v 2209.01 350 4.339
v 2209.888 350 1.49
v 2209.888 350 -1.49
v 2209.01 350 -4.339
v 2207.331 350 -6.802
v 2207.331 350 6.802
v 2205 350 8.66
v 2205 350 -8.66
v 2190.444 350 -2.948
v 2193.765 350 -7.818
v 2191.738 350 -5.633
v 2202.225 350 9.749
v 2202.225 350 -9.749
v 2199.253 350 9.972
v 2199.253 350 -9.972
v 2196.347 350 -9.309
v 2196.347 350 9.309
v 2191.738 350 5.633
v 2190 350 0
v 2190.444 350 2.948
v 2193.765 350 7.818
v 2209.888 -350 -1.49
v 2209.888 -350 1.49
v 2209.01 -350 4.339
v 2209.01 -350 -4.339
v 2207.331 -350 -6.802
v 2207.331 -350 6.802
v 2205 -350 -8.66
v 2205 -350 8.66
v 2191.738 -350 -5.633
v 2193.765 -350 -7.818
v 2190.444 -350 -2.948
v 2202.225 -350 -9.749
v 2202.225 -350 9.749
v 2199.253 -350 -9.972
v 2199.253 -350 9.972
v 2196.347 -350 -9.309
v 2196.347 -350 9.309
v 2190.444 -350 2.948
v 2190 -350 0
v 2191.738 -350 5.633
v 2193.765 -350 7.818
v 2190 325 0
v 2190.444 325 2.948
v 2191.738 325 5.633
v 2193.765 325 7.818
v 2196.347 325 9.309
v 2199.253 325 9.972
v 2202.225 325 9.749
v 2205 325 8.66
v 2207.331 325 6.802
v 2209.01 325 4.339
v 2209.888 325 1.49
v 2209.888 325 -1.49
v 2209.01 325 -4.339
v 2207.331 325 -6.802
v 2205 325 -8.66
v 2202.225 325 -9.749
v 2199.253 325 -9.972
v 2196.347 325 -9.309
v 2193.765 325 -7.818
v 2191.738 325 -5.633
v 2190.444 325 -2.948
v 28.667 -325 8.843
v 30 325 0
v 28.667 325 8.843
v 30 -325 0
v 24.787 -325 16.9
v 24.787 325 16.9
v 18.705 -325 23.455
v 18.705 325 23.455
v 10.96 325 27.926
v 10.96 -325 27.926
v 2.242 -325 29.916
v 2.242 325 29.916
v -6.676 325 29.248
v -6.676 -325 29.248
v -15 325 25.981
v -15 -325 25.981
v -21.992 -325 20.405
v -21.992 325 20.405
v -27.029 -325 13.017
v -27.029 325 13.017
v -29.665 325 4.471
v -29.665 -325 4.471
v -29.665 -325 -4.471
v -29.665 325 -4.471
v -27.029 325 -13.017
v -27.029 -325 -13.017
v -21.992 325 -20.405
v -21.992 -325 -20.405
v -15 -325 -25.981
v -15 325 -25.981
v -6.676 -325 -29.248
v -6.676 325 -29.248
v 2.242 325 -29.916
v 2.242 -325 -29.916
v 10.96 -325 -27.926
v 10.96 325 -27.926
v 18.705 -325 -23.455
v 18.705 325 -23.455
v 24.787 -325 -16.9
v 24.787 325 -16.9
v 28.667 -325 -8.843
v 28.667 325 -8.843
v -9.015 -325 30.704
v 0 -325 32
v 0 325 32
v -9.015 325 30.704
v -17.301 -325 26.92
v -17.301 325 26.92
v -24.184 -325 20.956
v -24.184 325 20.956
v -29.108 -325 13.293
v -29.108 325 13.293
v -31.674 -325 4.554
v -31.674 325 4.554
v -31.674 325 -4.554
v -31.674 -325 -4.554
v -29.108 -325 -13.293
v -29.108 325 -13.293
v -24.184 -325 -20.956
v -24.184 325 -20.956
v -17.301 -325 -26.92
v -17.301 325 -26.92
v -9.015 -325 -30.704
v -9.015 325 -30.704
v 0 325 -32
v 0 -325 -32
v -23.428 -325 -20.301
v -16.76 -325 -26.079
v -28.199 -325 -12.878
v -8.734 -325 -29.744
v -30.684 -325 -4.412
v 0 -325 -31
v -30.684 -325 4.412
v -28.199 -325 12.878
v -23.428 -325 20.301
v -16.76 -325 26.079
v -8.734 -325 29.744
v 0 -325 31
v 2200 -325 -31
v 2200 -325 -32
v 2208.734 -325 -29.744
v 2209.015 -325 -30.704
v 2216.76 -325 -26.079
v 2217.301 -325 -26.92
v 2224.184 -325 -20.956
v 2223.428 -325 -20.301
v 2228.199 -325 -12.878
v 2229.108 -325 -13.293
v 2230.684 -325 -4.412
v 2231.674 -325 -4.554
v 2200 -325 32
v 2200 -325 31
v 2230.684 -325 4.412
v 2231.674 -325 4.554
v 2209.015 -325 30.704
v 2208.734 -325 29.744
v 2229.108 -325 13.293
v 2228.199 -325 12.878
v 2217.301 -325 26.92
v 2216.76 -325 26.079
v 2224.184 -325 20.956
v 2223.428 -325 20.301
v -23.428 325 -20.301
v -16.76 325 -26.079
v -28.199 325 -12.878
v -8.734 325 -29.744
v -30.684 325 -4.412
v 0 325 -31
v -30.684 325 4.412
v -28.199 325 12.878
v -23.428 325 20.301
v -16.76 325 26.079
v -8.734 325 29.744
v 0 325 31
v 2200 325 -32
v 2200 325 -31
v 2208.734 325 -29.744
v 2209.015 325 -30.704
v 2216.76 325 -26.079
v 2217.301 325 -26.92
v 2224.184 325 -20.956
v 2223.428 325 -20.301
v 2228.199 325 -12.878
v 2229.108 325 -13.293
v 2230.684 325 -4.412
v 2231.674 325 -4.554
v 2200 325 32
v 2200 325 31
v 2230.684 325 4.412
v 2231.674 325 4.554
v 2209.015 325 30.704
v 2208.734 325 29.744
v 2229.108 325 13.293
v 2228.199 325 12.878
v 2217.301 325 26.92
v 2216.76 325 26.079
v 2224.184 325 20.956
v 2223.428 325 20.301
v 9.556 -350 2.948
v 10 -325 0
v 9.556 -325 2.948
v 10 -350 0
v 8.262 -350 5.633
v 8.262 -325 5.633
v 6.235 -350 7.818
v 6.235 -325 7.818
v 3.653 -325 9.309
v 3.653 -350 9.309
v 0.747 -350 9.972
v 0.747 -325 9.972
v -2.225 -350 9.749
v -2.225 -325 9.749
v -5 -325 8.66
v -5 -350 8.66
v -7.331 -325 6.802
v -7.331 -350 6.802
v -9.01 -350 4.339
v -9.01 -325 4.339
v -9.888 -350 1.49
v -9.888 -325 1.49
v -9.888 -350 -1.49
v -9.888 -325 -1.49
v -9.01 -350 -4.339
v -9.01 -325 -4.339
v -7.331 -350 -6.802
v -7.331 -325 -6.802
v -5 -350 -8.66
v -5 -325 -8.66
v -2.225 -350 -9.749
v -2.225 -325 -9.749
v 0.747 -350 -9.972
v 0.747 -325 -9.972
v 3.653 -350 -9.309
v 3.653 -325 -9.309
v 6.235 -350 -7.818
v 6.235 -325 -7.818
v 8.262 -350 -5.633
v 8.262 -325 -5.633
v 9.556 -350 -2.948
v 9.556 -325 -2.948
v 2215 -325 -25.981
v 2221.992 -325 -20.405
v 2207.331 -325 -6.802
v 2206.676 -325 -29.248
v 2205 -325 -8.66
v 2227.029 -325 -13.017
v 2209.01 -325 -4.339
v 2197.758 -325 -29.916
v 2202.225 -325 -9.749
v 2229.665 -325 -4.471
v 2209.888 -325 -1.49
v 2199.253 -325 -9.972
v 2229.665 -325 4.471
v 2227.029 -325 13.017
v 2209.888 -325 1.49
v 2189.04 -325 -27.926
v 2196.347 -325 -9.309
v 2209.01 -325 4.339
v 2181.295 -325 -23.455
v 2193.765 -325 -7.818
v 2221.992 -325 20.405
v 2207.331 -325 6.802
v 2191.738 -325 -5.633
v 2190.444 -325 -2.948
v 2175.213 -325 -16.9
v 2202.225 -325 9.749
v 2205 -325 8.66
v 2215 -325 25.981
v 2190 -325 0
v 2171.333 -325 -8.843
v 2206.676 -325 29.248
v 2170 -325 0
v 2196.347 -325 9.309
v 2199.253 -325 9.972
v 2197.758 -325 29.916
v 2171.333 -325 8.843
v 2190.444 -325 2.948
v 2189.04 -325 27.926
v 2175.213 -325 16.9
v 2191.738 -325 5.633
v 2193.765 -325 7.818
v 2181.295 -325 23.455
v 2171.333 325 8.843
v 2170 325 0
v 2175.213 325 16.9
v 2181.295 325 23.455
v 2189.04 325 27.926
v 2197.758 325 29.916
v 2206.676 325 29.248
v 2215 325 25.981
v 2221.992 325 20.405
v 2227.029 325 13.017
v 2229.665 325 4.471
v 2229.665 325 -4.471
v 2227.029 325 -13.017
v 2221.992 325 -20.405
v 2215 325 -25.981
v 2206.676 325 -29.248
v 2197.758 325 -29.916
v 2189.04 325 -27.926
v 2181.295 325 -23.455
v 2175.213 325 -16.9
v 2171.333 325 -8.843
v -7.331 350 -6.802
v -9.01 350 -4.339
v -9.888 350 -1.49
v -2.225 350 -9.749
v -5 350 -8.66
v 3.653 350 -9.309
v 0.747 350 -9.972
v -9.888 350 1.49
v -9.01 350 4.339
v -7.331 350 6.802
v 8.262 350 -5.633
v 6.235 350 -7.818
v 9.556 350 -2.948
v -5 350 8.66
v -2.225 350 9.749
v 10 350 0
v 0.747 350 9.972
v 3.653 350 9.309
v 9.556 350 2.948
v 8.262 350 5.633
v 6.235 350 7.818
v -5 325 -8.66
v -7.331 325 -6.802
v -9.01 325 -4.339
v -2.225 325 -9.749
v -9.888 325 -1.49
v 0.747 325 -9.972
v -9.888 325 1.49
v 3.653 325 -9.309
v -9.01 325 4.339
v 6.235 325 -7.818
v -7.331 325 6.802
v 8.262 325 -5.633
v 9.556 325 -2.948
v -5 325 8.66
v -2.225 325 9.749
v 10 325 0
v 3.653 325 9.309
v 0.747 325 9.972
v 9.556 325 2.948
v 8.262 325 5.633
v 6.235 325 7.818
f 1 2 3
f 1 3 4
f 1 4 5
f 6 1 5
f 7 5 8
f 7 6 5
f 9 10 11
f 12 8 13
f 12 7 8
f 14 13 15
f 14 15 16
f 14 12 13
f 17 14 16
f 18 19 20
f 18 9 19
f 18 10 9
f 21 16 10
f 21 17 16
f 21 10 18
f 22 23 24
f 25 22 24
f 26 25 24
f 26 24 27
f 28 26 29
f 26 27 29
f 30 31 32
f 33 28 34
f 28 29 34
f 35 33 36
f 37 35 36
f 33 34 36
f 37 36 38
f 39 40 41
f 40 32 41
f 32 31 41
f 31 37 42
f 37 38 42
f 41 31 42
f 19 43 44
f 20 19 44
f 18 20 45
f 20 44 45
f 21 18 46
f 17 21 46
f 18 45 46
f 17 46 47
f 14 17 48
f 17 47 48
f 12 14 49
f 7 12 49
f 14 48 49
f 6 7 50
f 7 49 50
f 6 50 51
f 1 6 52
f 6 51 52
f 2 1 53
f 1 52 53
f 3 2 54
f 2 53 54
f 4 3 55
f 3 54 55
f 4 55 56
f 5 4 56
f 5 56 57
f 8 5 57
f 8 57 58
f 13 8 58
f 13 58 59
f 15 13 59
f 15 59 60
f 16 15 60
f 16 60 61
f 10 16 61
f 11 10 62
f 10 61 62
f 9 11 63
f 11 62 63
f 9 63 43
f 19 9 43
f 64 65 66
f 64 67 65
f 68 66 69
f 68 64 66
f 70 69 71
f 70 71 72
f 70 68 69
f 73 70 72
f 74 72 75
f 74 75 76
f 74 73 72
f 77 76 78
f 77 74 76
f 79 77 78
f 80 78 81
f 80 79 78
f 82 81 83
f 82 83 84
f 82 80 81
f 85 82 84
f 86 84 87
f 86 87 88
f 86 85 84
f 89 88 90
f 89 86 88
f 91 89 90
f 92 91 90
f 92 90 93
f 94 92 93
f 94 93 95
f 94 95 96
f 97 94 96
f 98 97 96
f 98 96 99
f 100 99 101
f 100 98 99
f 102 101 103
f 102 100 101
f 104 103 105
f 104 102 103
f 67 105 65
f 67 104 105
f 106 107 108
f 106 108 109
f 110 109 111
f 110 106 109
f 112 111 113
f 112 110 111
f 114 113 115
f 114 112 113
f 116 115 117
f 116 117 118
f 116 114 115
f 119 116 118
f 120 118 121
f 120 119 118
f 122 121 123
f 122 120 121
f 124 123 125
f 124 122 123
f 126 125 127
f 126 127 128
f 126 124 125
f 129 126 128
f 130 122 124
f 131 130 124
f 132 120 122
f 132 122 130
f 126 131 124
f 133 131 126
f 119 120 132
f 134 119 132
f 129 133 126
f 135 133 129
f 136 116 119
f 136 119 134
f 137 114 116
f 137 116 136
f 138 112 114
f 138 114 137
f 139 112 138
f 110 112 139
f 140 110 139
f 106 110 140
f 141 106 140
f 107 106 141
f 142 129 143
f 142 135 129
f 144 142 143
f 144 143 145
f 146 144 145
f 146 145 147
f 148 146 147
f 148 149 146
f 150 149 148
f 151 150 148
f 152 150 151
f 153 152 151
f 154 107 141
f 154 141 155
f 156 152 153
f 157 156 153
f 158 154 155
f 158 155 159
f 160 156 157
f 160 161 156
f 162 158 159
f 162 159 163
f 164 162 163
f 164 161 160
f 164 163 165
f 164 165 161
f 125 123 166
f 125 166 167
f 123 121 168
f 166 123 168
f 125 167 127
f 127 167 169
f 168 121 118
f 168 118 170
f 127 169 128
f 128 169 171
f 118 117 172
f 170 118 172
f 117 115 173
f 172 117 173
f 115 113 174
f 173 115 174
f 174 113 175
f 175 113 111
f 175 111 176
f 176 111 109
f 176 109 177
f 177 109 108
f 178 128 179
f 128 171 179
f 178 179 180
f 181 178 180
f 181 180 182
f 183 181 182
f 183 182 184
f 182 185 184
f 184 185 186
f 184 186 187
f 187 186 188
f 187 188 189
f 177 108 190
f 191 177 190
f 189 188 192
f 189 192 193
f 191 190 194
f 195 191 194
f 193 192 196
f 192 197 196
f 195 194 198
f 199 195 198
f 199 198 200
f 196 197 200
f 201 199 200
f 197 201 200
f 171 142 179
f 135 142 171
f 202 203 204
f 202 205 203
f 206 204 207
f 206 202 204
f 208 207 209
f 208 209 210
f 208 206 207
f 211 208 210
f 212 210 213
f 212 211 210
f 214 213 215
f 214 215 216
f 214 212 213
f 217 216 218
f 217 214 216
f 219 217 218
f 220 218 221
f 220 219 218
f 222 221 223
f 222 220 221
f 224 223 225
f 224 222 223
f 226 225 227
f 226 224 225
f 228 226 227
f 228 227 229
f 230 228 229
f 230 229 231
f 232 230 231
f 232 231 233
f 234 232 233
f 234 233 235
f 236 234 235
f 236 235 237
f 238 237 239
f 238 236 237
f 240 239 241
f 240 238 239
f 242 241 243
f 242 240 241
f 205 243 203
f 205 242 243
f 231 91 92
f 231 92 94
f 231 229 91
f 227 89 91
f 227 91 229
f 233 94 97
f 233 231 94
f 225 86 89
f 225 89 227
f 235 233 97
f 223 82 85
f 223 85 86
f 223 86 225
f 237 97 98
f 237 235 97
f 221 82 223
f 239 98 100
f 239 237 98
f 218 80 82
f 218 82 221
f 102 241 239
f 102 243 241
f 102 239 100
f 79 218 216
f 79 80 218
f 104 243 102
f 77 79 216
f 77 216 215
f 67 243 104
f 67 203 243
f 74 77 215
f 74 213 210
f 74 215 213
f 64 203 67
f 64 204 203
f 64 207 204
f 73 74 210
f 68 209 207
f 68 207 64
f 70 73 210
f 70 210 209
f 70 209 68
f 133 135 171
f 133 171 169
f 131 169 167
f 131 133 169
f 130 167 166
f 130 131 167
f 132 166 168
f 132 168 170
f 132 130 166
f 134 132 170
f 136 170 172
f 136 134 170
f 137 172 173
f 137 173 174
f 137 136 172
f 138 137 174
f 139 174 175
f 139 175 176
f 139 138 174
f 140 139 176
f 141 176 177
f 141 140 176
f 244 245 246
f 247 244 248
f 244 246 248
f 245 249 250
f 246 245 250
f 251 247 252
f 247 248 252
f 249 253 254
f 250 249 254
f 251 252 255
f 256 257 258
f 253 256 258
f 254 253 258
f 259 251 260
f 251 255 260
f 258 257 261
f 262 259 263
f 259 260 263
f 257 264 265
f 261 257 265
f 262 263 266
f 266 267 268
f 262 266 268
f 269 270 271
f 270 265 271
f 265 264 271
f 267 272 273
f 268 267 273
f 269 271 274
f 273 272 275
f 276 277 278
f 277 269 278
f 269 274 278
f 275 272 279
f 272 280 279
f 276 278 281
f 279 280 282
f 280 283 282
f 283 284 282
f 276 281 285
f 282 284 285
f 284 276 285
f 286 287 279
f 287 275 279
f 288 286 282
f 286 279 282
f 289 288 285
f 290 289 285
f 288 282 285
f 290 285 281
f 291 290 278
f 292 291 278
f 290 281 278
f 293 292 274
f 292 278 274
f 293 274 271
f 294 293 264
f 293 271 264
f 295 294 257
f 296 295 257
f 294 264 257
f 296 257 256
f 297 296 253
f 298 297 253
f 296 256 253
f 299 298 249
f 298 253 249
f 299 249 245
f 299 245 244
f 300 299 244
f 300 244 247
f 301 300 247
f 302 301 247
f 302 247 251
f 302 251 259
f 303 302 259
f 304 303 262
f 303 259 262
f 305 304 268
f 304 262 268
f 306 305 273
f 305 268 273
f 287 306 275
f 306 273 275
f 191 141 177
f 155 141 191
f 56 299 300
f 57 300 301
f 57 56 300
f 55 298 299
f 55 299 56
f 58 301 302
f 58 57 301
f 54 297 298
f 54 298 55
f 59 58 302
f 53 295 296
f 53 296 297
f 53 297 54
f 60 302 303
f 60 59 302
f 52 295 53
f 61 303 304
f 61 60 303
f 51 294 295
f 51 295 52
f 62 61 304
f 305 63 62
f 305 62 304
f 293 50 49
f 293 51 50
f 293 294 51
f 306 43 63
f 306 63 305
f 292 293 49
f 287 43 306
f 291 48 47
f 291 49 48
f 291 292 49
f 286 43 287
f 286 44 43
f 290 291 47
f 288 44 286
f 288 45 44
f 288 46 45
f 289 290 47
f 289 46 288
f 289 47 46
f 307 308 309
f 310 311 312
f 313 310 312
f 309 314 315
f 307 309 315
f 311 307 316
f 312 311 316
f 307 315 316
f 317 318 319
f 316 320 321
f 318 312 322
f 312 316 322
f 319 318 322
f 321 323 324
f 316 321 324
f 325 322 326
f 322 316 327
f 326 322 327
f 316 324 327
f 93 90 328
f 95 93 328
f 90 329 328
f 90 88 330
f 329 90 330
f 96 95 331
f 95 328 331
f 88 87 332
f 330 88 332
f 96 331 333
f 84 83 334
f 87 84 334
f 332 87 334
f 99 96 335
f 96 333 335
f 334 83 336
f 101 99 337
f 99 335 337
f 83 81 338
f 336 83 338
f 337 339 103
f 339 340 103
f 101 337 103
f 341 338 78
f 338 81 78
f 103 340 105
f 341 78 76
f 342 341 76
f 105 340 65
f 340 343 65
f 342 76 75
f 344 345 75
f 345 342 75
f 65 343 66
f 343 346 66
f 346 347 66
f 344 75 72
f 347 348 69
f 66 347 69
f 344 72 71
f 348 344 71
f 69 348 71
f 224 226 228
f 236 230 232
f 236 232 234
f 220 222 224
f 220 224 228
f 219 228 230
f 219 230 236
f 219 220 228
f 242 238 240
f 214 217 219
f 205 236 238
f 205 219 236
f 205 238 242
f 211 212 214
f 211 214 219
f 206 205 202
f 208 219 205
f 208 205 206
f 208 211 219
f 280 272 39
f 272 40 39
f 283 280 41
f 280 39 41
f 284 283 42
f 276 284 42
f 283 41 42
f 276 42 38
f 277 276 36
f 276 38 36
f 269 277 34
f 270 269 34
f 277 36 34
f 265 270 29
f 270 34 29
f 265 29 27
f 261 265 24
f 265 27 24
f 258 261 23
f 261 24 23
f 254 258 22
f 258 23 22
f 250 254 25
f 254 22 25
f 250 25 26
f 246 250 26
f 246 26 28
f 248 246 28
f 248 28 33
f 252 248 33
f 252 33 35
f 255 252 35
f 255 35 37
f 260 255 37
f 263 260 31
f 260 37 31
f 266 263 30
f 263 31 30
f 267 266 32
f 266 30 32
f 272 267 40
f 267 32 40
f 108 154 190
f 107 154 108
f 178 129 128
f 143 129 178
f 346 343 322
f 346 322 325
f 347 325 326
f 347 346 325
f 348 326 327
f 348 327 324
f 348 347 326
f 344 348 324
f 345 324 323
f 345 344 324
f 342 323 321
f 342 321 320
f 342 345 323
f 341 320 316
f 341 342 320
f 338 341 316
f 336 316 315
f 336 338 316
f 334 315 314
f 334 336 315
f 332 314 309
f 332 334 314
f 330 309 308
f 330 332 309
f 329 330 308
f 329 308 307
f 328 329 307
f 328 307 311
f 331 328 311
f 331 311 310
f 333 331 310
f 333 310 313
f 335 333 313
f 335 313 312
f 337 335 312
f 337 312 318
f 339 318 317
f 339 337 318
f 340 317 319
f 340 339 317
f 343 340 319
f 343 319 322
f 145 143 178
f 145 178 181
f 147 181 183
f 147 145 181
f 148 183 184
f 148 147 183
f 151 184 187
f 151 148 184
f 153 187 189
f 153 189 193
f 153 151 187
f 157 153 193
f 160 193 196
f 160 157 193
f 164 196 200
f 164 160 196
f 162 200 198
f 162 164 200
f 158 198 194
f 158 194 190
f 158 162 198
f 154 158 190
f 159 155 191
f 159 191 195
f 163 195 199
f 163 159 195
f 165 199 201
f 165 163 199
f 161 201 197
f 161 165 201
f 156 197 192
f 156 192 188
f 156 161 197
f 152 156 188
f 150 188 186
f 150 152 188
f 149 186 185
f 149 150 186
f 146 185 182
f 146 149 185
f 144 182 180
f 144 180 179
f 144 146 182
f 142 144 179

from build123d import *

# Parameters (mm, degrees)
F0_R     = 10
F1_DEPTH = 350
F3_R     = 30
F4_DEPTH = 325
F8_DEPTH = 650


with BuildPart() as f1:
    # F0 (on Front) → F1 (new body, symmetric)
    with BuildSketch(Plane.XZ):
        Circle(F0_R)
    extrude(amount=F1_DEPTH, both=True)

    # F3 (on offset) → F4 (join, symmetric)
    with BuildSketch(Plane.XZ):
        Circle(F3_R)
    extrude(amount=F4_DEPTH, both=True)


with BuildPart() as f6_1:
    # F6: instance of F1
    add(f1.part.mirror(Plane.YZ.offset(1100)))


with BuildPart() as f8:
    # F7 (on face) → F8 (new body, through all)
    with BuildSketch(Plane.XZ.offset(325)):
        with BuildLine():
            Line((2200, 32), (0, 32))
            ThreePointArc((0, 32), (-32, 0), (0, -32))
            Line((0, -32), (2200, -32))
            ThreePointArc((2200, -32), (2232, 0), (2200, 32))
        make_face()
        with BuildLine():
            ThreePointArc((0, -31), (-31, 0), (0, 31))
            Line((0, 31), (2200, 31))
            ThreePointArc((2200, 31), (2231, 0), (2200, -31))
            Line((2200, -31), (0, -31))
        make_face(mode=Mode.SUBTRACT)
    extrude(amount=-F8_DEPTH)


solid = Compound([f1.part, f6_1.part, f8.part])
